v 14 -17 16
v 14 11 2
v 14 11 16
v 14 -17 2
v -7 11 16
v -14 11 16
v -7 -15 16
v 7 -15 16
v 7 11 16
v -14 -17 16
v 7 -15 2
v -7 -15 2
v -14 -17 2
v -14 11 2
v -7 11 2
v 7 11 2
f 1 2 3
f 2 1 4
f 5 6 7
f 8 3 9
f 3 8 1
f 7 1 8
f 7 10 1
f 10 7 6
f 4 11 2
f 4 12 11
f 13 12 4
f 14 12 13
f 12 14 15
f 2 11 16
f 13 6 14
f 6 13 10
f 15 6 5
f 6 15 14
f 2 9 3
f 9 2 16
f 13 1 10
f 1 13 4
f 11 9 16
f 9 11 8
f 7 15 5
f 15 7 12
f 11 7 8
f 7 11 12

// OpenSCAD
$fn=100;
module slide(){
	difference(){
		translate([0,-8,9])cube([28,28,14], center=true);
		translate([0,-6,9]) cube ([14,28,15], center=true);
	}
}

module cutter(){
	difference(){
		cube ([26,26,14], center=true); // outside
		translate([0,4,0]) cube ([14,26,15], center=true); // inside
		for (i = [3:6])  { 
			translate([0,i,1]) cube ([30,0.4,14], center=true); // knife cuts
			}
	}
}

module base(){
	cube ([38,40,4], center=true);
	translate([0,6,9]) cube ([13,28,17], center=true);
	translate([-19,0,2])side();
	translate([15,0,2])side();
}

module side(){
//	translate([16,13,13]) cube([4,2,h], center=true);
//	translate([-16,13,13]) cube([4,2,h], center=true);
	translate([0,-2,0]) cube([4,9,h]);
	h=14;
	translate([0,5,h]) cube([4,2,h]);
	translate([0,-2,h]) cube([4,2,h]);
}


color("yellow") translate([0,5,0]) slide();
//translate([0,-2,23]) cutter();

//color("grey") base();
